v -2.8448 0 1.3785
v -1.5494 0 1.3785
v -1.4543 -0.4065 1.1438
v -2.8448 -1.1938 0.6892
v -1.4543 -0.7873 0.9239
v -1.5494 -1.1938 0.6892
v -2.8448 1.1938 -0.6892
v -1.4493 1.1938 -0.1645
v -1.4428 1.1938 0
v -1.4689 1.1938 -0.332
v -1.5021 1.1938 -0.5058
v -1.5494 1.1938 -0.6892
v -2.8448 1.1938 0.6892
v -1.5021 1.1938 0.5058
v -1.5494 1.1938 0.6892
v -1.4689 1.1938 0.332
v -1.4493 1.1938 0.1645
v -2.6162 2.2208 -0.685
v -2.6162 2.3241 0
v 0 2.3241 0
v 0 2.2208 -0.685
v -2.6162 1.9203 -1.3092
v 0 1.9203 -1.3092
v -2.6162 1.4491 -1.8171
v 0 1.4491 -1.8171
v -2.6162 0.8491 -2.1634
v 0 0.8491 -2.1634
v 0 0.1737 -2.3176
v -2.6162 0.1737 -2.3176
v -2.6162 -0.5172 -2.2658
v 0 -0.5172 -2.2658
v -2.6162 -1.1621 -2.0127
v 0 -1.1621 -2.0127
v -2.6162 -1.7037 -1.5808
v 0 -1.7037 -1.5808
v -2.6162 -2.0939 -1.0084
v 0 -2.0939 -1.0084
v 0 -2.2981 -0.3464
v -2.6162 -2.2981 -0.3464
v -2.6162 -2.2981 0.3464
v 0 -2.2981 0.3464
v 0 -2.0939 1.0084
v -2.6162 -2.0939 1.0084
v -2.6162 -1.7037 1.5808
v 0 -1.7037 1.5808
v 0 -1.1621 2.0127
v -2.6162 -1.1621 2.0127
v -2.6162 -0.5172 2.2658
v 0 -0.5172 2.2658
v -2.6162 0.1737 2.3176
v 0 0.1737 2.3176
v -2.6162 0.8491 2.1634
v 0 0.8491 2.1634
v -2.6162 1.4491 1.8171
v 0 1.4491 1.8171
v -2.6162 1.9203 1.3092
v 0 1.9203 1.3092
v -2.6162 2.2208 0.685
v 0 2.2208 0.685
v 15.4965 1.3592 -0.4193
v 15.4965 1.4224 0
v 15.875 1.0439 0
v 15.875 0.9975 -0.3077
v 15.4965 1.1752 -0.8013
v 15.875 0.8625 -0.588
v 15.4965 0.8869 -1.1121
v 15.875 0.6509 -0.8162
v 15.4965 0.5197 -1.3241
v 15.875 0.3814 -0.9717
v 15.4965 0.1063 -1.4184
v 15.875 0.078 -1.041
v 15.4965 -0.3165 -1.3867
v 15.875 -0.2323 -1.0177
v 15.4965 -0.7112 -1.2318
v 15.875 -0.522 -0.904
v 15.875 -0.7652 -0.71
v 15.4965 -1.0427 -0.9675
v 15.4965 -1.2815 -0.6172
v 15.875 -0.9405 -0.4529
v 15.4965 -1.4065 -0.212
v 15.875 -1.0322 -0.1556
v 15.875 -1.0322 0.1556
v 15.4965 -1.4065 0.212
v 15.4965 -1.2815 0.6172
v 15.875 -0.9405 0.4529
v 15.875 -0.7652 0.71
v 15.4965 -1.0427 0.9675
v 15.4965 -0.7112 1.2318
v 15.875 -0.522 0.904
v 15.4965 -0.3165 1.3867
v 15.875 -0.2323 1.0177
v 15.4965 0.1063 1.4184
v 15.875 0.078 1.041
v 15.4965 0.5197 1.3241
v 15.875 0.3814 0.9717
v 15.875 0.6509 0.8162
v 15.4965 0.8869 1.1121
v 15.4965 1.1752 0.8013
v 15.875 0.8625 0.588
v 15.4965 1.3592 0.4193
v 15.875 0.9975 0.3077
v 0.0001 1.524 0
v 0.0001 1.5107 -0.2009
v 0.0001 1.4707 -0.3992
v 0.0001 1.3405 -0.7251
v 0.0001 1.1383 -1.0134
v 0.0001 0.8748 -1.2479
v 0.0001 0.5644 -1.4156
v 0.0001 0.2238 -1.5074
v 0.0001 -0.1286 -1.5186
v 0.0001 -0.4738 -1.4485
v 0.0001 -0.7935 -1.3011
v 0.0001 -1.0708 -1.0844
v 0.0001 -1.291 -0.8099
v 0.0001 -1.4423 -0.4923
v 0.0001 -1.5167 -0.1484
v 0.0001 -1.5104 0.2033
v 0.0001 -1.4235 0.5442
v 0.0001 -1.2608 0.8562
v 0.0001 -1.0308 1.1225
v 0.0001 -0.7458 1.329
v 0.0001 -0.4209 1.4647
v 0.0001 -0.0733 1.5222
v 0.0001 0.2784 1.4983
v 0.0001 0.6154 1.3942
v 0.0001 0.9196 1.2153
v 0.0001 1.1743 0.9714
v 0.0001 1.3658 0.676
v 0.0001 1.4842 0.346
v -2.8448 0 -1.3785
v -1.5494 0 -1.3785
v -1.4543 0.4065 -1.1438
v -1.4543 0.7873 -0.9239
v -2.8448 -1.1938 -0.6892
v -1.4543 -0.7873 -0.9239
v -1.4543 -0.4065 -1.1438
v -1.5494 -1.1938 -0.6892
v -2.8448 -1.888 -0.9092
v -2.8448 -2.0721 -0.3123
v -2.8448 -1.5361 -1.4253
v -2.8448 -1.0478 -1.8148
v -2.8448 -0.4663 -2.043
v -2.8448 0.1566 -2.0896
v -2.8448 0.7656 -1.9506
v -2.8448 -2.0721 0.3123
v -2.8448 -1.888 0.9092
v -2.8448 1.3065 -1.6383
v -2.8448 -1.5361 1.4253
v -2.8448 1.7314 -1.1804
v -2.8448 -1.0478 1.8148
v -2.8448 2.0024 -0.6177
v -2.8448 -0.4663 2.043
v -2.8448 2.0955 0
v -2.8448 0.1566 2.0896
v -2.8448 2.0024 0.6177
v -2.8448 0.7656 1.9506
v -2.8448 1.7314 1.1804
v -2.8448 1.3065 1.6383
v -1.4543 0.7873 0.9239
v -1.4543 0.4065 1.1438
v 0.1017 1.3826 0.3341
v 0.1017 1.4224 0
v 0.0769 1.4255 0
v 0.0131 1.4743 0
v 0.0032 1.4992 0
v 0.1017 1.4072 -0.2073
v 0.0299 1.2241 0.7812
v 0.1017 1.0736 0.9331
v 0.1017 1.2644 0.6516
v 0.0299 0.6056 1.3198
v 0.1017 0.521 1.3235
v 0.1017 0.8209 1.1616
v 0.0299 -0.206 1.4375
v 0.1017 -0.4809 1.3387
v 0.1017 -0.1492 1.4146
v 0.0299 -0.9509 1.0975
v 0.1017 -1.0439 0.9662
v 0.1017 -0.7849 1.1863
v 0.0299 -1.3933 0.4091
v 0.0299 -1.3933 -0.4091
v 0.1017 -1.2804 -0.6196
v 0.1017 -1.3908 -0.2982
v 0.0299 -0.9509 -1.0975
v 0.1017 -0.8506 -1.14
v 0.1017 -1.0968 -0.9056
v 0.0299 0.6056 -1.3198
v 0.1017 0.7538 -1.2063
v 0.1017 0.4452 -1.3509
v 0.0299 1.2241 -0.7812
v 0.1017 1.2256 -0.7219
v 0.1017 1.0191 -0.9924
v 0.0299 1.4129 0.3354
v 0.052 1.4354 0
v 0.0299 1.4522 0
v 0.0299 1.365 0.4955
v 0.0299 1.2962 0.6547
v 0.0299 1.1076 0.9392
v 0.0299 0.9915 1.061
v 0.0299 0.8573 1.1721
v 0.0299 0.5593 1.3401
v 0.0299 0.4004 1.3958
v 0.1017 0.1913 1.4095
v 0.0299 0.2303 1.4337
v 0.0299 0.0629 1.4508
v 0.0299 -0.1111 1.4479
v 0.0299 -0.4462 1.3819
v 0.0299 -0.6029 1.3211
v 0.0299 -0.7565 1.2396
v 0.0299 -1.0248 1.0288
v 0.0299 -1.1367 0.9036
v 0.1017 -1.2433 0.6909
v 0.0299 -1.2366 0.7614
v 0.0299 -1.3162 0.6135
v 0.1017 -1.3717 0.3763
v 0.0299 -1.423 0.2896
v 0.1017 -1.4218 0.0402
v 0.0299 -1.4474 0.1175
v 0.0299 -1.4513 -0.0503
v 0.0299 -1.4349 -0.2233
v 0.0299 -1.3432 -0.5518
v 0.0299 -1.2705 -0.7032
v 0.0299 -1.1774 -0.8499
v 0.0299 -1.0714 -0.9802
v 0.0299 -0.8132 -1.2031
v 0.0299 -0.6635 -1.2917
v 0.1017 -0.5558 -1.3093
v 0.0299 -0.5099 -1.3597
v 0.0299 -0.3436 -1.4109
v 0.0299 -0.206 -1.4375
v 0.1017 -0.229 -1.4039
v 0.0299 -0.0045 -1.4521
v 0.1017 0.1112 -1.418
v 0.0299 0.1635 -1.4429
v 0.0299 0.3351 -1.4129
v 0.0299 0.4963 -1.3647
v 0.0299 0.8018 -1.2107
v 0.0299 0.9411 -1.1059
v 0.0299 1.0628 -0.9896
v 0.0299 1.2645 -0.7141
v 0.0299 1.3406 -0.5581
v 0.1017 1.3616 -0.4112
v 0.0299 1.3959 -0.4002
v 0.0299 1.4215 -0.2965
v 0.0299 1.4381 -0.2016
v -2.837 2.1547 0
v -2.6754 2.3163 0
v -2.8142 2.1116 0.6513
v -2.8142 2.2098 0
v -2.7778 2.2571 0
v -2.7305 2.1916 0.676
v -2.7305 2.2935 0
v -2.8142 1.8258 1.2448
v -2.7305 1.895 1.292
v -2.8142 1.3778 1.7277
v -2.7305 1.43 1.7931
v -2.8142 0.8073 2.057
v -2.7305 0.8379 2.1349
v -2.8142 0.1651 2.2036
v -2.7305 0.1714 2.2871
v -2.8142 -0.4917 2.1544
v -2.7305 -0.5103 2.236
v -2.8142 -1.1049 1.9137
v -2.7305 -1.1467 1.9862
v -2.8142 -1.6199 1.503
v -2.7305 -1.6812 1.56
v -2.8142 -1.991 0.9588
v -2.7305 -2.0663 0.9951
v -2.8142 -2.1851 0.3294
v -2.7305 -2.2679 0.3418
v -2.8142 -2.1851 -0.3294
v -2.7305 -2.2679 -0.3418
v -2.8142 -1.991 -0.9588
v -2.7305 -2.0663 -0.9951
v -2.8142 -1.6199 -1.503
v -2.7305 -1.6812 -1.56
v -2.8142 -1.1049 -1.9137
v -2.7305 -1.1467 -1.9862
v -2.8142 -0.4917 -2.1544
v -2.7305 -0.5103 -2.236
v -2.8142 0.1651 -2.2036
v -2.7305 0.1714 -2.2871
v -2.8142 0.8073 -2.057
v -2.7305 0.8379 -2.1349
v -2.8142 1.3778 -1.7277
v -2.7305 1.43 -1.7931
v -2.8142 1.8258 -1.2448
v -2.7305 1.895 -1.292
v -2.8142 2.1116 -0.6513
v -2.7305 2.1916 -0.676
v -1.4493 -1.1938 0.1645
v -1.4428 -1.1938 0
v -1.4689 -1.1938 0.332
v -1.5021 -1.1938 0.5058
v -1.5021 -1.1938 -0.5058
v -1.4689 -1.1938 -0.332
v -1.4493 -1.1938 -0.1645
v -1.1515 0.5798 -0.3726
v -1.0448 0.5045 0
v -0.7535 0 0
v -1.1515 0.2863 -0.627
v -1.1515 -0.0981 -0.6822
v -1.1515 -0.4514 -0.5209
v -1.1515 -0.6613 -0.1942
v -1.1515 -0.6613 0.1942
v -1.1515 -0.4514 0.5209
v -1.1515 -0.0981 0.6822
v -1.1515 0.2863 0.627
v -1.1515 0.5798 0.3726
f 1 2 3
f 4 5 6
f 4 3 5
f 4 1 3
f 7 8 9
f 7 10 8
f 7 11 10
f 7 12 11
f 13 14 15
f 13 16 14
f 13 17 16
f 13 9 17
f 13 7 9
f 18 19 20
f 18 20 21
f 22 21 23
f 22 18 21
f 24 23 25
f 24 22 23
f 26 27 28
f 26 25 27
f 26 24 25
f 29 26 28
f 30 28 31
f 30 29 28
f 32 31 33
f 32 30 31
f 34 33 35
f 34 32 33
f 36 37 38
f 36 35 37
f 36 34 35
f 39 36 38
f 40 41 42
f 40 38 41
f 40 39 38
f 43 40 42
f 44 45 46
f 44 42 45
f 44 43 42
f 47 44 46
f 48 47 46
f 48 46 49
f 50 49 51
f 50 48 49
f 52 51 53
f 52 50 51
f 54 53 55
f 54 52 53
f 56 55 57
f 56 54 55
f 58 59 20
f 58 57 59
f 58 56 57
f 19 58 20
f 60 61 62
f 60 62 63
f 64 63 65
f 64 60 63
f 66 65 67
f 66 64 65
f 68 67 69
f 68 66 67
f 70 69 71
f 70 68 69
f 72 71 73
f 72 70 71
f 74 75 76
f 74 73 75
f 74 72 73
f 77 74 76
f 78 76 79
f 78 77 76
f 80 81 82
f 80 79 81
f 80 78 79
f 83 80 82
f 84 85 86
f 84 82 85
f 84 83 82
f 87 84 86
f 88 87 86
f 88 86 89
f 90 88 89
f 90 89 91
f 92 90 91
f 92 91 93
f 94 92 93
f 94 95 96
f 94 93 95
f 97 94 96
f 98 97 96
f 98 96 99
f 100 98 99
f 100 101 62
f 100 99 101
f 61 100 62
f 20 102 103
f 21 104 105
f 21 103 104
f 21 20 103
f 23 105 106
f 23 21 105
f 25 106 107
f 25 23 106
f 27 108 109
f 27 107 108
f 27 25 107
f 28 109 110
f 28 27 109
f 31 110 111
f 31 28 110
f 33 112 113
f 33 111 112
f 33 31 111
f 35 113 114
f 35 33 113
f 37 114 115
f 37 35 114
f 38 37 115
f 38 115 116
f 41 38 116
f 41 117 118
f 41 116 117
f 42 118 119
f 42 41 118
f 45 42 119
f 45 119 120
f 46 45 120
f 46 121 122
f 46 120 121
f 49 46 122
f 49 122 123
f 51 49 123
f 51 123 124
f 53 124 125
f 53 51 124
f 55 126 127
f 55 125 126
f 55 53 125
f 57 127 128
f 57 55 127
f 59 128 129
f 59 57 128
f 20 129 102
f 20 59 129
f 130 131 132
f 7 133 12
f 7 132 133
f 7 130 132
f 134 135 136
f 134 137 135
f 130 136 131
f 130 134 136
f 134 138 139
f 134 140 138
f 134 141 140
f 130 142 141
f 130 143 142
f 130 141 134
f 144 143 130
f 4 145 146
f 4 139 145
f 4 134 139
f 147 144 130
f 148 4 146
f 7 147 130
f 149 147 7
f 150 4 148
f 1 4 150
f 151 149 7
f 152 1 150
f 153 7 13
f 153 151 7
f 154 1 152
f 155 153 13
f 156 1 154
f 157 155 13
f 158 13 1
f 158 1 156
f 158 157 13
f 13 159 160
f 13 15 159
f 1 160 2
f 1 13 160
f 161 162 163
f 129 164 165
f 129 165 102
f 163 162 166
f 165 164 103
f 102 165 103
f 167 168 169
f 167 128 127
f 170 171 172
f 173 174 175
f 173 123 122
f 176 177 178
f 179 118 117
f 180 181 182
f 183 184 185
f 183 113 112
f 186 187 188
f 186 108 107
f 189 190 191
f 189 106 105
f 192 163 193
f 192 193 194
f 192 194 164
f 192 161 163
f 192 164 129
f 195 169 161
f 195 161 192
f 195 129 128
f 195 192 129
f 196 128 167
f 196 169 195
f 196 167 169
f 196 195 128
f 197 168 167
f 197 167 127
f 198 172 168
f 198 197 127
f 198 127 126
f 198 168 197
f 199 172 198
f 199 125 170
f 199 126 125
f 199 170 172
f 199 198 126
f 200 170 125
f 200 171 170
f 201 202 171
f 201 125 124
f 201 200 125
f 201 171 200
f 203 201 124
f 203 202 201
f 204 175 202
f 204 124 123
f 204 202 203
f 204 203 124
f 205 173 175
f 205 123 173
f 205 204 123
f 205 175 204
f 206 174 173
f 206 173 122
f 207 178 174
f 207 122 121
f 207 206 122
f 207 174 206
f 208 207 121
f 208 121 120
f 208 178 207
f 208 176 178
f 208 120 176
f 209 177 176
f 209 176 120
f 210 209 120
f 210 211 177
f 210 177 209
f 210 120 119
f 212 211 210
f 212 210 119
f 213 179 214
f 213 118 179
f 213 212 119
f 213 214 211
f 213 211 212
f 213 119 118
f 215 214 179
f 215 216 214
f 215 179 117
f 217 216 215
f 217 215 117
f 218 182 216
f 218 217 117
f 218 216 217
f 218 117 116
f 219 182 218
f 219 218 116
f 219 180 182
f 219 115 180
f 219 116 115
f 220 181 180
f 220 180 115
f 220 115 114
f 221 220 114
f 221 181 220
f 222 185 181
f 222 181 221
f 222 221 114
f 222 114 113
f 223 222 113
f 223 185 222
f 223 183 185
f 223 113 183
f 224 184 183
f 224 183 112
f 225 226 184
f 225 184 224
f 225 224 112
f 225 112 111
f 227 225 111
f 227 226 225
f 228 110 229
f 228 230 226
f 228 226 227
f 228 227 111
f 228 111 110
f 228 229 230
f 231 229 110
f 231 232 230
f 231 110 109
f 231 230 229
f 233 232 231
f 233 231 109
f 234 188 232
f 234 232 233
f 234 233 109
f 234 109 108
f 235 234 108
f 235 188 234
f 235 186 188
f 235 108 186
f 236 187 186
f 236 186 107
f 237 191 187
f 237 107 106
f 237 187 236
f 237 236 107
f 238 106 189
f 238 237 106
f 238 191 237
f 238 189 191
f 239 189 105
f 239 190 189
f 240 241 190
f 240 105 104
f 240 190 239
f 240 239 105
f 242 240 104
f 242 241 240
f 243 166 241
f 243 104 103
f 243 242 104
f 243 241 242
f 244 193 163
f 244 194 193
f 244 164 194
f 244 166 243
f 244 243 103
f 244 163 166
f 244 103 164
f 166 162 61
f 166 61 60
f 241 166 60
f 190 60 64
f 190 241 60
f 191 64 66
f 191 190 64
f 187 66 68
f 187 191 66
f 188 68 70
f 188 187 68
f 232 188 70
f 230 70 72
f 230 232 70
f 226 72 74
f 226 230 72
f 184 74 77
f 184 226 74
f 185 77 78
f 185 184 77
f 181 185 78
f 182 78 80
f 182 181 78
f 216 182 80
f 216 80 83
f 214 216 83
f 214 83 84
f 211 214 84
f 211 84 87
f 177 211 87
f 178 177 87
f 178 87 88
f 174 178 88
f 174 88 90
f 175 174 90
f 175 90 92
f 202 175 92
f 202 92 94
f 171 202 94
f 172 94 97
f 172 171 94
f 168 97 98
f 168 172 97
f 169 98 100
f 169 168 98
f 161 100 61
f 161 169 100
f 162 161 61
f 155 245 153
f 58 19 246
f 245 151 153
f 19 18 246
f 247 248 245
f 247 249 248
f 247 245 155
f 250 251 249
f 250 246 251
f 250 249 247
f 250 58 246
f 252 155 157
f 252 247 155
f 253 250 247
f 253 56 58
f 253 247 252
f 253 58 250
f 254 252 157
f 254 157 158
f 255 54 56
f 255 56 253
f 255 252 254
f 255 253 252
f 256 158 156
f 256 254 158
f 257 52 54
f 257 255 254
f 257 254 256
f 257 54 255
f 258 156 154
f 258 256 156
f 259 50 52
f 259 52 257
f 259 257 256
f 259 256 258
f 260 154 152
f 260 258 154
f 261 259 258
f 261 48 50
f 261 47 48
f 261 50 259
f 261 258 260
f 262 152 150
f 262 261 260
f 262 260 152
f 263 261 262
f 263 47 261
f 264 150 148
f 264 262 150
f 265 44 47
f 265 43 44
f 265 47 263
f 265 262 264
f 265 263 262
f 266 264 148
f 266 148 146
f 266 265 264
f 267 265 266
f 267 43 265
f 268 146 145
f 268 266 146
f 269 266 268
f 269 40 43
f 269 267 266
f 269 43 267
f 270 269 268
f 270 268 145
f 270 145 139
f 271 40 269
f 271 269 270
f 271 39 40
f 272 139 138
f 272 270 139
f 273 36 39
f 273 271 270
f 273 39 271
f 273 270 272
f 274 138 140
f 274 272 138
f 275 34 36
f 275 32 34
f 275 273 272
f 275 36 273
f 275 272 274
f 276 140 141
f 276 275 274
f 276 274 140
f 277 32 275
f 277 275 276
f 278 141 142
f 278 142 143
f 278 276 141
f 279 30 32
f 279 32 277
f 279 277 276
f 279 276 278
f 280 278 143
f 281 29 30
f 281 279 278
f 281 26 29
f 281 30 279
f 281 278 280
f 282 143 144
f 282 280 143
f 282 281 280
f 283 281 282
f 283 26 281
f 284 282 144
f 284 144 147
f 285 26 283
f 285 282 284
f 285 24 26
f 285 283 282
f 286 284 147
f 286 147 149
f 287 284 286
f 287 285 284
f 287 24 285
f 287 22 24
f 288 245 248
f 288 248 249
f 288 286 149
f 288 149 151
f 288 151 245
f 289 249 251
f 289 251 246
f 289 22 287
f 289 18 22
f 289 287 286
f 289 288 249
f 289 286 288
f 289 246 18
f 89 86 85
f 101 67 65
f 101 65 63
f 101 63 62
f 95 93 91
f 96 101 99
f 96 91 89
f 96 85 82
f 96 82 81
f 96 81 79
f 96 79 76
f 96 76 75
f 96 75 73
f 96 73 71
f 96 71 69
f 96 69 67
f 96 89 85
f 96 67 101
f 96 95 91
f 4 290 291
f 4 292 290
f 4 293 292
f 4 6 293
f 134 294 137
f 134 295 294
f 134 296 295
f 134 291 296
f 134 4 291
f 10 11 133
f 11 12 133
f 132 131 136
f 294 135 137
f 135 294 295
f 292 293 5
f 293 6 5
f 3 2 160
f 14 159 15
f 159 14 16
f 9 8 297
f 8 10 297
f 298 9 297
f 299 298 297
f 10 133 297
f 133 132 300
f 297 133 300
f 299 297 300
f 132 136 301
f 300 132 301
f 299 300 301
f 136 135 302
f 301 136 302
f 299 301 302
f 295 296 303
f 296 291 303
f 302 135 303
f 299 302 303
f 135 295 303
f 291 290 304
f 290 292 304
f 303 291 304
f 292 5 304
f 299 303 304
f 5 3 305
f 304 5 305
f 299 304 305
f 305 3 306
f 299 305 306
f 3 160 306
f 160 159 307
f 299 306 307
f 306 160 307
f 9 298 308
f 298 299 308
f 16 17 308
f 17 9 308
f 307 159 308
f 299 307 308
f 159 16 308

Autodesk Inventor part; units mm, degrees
ref_plane "YZ Plane" through (0, 0, 0) normal (1, 0, 0) x (0, 1, 0)
ref_plane "XZ Plane" through (0, 0, 0) normal (0, 1, 0) x (-1, 0, 0)
sketch "Sketch1" plane through (0, 0, 0) normal (0, 0, 1) x (1, 0, 0)
  line L0 (-0.7535, 0) -> (15.875, 0)
  line L1 (15.875, 0) -> (15.875, 1.4224)
  line L2 (15.875, 1.4224) -> (1.5877, 1.4224)
  line L3 (1.5877, 1.4224) -> (0.0001, 1.4224)
  line L4 (0.0001, 1.4224) -> (0, 1.4224)
  line L5 (0, 1.4224) -> (0, 2.3241)
  line L6 (0, 2.3241) -> (-2.8448, 2.3241)
  line L7 (-2.8448, 2.3241) -> (-2.8448, 1.3785)
  line L8 (-2.8448, 1.3785) -> (-1.5494, 1.3785)
  line L9 (-1.5494, 1.3785) -> (-0.7535, 0)
  line L10 (-6.5888, 0) -> (19.619, 0) projected
  line L11 (0, -0.4648) -> (0, 2.7889) projected
  line L12 (1.5877, 1.4224) -> (0, 1.4224) construction
  dimension "d1" = 14.2873
  dimension "d2" = 1.5876
  dimension "d3" = 2.8448
  dimension "d4" = 1.2954
  dimension "d5" = 60
  dimension "d6" = 2.8448
  dimension "d7" = 2.8448
  dimension "d8" = 2.757
  dimension "d9" = 4.6482
  dimension "d26" = 15.875
revolve "Body" add sketch "Sketch1" angle 360 about axis through (-0.7535, 0, 0) along (1, 0, 0)
sketch "Sketch2" plane through (-2.8448, 0, 0) normal (-1, 0, 0) x (0, 0, 1)
  circle A0 centre (0, 0) radius 1.3785 projected
  line L0 (0, -3.2537) -> (0, 3.2537) projected
  line L1 (-3.2537, 0) -> (3.2537, 0) projected
  line L2 (1.3785, 0) -> (0.6892, -1.1938)
  line L3 (0.6892, -1.1938) -> (-0.6892, -1.1938)
  line L4 (-0.6892, -1.1938) -> (-1.3785, 0)
  line L5 (-1.3785, 0) -> (-0.6892, 1.1938)
  line L6 (-0.6892, 1.1938) -> (0.6892, 1.1938)
  line L7 (0.6892, 1.1938) -> (1.3785, 0)
  point P0 (0, 0)
extrude "Slot" add sketch "Sketch2" against normal up to next contours L7 A0 | A0 L2 | L6 L0 A0 | A0 L0 L3 | L0 L6 A0 | A0 L3 L0 | L4 A0 | A0 L5
fillet "Fillet1" radius 0.2286 1 edges at (-2.8448, -2.3241, 0)
thread "Thread" size "4-40 UNC" class "2A" standard "ANSI Unified Screw Threads" length 14.2873
chamfer "Chamfer1" distance 0.3785 distance2 0.3785 1 edges at (15.875, -1.4224, 0) measured on face at (15.875, -0.3591, -0.7201)
ref_plane "Work Plane1" through (29, 0, 0) normal (0, -1, 0) x (1, 0, 0)
fillet "Fillet2" radius 0.1016 1 edges at (0.0001, -1.4224, 0)
equation "\"d1\" = GEL"
equation "\"d3\" = KOH"
equation "\"d4\" = INTI"
equation "\"d6\" = GD"
equation "\"d7\" = BDM"
equation "\"d8\" = 1.1547 * SW"
equation "\"d9\" = KOD"
equation "\"d26\" = NLG"
equation "\"d30\" = R"
equation "\"d17\" = RR"
equation "\"d13\" = GEL"
equation "\"d15\" = -0.5 * SPD + 0.5 * GD"
equation "\"d16\" = GUL"
equation "\"GD\" = 2.8448"
equation "\"NLG\" = 15.875"
equation "\"GEL\" = 14.2873"
equation "\"KOD\" = 4.6482"
equation "\"KOH\" = 2.8448"
equation "\"INTI\" = 1.2954"
equation "\"GAL\" = 1.5875"
equation "\"GUL\" = 0.37846"
equation "\"BDM\" = 2.8448"
equation "\"SW\" = 2.3876"
equation "\"RR\" = 0.2286"
equation "\"SPD\" = 2.08788"
equation "\"R\" = 0.1016"
equation "\"PHH\" = 0.127"
equation "\"GD1\" = SPD"
equation "\"THREADDIA\" = 2.8448"
equation "\"FAWI\" = 45deg"
equation "\"KOH1\" = 2.5654"
equation "\"NND\" = 2.8448"
equation "\"TOA\" = 30deg"
equation "\"E0\" = 1.155 * SW"
properties part number "ANSI B18.3 - No. 4 - 40 UNC - 5/8 HS HCS" material "Steel, Mild"
